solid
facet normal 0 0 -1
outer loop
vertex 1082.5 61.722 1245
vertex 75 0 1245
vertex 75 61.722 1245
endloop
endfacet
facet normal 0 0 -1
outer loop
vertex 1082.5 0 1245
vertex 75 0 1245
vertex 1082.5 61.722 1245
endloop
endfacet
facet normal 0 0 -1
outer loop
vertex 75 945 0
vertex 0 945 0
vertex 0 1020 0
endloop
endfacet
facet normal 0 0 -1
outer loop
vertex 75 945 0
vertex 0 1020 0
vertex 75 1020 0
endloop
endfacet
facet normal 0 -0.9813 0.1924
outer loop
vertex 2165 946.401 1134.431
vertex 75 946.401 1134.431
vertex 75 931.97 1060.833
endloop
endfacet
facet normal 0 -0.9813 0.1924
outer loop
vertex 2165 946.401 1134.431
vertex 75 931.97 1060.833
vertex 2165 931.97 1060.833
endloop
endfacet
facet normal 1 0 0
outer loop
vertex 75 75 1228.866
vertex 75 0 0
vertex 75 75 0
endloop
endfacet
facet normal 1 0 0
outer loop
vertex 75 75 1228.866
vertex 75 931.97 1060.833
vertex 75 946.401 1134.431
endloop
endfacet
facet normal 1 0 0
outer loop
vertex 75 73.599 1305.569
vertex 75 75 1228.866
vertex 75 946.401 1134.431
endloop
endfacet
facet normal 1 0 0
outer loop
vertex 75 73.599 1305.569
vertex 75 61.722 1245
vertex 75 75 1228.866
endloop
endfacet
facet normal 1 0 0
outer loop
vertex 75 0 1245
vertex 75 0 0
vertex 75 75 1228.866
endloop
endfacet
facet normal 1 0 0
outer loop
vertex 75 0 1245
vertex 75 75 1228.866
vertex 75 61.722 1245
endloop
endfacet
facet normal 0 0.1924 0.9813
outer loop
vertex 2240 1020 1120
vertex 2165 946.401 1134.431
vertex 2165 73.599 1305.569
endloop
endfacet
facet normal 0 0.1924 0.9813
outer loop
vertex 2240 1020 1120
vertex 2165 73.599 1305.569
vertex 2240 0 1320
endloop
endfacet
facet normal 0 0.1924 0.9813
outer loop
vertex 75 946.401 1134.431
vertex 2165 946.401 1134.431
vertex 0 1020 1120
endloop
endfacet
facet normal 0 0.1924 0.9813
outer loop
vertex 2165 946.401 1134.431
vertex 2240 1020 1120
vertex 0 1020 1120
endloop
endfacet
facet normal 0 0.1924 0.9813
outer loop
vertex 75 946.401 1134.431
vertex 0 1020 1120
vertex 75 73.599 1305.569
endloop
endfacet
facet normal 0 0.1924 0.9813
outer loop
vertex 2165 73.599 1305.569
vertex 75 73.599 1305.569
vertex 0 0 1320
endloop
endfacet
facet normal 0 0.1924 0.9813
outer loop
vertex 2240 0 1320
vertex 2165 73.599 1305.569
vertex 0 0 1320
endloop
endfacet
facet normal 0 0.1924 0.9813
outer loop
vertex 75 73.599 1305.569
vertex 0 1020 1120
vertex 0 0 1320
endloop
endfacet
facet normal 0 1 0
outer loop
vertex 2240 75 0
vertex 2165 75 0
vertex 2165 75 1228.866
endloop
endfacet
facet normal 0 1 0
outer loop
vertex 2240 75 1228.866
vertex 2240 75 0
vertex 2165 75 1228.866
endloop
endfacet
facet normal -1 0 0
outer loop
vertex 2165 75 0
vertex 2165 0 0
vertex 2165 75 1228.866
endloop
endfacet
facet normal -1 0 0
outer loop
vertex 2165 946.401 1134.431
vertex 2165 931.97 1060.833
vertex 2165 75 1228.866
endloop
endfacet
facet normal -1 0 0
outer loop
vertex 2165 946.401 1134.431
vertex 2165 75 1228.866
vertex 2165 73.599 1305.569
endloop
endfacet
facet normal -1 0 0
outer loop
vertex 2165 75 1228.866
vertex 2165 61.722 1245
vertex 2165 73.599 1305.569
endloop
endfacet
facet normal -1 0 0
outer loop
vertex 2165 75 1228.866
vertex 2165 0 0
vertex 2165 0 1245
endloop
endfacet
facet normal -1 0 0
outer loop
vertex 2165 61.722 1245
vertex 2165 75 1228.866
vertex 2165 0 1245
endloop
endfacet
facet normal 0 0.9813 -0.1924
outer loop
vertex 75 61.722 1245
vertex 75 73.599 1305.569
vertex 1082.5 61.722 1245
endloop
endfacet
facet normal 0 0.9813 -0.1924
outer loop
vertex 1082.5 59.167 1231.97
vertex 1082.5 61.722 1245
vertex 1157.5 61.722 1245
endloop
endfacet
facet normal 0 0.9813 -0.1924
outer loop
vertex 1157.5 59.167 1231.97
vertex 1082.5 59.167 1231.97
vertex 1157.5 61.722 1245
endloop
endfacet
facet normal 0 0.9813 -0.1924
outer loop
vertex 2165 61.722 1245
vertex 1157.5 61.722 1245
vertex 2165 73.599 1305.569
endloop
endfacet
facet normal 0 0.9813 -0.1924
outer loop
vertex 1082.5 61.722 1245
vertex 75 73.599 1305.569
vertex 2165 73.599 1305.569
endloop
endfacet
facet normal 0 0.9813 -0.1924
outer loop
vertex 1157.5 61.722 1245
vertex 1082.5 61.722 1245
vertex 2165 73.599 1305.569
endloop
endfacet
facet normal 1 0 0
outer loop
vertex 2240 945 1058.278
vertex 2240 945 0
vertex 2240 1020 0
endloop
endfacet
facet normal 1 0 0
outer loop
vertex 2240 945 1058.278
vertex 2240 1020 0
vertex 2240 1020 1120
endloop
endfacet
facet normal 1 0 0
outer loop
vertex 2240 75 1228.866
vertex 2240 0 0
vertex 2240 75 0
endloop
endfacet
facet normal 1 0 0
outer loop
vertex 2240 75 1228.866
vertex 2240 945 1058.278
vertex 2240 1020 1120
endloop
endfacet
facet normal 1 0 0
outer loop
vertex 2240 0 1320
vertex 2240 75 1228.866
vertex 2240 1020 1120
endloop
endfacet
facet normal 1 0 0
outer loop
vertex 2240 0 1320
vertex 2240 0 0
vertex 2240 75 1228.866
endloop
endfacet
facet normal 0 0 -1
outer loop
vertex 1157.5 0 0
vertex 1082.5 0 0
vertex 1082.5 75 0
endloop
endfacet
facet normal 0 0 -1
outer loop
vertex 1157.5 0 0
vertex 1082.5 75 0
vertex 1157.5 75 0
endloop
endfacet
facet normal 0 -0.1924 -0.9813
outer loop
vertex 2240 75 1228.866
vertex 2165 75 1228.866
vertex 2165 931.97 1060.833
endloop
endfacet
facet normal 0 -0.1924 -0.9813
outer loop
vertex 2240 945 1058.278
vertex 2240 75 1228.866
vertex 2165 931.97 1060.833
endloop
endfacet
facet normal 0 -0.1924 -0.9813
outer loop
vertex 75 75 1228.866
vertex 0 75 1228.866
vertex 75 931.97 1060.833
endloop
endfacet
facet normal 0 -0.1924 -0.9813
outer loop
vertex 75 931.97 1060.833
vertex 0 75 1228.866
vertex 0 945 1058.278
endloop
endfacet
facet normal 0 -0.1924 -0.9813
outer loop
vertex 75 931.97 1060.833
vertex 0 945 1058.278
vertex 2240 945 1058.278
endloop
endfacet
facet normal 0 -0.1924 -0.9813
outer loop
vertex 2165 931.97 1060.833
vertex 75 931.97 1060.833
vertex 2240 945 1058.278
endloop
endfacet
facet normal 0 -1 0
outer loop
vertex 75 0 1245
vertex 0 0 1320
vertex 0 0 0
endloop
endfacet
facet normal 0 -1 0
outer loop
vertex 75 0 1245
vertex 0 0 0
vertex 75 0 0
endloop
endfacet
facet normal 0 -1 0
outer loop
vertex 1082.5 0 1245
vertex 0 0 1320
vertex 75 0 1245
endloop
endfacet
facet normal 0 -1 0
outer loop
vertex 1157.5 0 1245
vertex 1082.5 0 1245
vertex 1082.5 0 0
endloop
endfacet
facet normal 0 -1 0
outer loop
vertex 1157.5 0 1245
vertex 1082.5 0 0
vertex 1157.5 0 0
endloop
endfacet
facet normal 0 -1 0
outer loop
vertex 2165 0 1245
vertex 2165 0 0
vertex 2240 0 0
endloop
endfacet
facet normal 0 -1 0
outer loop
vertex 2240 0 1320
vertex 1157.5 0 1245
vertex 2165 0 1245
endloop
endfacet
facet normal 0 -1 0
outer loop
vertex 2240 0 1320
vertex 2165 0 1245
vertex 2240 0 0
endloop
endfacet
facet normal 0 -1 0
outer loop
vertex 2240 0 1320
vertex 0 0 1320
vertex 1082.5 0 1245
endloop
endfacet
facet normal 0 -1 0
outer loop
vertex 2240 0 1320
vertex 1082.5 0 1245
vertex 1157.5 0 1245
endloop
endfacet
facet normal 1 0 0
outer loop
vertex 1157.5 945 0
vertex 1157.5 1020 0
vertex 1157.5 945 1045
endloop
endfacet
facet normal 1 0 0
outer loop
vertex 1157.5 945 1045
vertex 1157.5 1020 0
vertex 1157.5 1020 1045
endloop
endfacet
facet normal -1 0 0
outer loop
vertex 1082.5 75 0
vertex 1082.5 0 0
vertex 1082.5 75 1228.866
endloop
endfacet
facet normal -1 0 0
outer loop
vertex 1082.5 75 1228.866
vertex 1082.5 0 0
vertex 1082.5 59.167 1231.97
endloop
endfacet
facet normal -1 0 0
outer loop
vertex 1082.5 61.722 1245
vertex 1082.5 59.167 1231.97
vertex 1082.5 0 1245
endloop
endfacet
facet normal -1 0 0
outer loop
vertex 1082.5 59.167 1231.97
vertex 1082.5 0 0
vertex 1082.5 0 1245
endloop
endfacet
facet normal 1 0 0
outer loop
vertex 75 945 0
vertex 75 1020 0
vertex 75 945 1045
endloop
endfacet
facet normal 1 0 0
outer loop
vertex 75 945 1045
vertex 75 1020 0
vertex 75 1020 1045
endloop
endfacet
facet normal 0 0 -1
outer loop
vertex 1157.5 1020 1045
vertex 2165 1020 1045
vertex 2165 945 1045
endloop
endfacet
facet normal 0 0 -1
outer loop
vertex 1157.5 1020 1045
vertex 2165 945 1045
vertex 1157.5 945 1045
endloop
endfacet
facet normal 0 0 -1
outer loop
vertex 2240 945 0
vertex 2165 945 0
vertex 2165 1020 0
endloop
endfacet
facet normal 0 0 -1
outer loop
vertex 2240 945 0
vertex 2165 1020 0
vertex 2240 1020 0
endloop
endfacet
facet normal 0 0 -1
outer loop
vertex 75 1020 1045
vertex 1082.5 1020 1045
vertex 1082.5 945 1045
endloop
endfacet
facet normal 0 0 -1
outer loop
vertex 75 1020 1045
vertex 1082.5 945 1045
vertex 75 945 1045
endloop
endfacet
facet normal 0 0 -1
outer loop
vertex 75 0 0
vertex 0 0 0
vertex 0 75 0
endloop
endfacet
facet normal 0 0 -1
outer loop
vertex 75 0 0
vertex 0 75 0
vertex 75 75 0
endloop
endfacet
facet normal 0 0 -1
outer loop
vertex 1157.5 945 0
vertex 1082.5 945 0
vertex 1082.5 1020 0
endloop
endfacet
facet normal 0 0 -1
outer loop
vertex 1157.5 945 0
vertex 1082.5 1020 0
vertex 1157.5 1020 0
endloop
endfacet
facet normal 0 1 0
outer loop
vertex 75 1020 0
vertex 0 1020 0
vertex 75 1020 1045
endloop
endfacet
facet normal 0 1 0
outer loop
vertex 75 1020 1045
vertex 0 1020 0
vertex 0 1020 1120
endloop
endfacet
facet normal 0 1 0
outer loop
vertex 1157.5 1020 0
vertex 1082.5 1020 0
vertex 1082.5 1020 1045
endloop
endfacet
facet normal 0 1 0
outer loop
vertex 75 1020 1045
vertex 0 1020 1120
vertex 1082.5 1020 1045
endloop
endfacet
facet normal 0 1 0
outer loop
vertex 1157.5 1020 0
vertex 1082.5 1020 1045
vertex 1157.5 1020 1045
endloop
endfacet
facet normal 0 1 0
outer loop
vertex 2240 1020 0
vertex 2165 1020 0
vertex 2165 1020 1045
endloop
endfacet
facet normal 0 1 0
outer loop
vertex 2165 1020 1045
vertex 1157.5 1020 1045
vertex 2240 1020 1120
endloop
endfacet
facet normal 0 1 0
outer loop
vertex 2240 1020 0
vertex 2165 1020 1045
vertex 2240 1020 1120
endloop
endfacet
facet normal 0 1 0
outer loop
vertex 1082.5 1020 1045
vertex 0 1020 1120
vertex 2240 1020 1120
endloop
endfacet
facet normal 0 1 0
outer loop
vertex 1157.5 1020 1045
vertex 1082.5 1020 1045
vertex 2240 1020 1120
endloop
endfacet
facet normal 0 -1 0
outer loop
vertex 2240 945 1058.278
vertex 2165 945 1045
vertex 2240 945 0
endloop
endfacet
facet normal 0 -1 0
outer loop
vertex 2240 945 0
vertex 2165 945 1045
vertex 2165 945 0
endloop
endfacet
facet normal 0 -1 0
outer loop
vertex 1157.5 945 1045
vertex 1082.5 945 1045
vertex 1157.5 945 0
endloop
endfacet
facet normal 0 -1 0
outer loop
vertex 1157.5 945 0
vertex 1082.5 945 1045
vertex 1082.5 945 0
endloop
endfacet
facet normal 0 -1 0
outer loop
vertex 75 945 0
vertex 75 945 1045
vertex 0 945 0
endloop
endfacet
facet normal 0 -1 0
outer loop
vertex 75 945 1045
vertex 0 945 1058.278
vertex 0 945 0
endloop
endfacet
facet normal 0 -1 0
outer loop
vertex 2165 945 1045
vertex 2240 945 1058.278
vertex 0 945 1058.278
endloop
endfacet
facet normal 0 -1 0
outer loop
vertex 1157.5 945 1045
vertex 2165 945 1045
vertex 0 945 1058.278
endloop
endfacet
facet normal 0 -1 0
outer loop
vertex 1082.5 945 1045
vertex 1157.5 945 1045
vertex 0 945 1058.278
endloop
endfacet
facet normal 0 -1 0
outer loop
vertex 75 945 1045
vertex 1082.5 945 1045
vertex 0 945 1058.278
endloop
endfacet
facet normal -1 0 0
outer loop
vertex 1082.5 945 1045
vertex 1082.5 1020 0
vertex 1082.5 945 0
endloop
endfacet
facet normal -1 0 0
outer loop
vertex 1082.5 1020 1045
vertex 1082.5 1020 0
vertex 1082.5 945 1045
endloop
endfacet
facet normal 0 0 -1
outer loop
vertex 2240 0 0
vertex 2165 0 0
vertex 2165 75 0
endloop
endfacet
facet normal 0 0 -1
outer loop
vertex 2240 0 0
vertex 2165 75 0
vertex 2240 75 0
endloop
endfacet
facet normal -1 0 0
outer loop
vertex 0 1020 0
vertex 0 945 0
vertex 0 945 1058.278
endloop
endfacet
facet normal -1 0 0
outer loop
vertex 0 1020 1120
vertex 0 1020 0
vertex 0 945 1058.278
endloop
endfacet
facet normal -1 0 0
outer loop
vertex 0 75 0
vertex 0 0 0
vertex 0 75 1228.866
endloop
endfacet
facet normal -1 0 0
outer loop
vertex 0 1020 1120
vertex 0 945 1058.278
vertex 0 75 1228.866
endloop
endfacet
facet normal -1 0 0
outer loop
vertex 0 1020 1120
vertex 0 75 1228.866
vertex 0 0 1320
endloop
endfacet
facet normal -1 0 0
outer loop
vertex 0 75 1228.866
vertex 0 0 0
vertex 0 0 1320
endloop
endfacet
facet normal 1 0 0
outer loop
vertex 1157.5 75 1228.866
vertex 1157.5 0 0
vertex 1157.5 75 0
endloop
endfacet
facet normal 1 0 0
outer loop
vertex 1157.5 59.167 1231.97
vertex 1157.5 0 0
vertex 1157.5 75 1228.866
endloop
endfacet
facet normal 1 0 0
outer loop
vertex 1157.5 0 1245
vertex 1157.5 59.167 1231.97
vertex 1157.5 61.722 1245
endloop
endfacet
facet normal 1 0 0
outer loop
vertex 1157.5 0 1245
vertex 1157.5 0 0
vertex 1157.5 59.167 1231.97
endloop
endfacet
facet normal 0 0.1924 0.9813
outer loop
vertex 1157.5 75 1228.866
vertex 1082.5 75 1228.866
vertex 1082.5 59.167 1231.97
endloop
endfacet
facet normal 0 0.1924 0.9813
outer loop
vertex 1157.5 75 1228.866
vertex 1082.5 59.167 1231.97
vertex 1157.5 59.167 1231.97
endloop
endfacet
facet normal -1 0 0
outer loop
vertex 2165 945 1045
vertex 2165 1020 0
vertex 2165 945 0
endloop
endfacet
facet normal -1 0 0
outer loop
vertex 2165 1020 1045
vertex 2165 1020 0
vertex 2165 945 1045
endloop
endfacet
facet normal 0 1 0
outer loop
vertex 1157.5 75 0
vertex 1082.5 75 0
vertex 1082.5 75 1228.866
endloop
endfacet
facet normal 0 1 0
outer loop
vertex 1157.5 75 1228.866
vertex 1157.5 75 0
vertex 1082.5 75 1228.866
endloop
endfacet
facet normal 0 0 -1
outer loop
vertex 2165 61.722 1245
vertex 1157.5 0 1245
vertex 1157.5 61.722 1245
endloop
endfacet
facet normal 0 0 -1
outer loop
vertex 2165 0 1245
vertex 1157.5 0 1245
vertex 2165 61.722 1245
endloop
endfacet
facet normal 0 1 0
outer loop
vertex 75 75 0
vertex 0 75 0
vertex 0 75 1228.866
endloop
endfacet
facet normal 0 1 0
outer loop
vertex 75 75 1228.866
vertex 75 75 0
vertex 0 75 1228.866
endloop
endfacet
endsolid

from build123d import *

# Parameters (mm, degrees)
F0_W      = 2240
F0_H      = 1320
F1_DEPTH  = 1020
F3_DEPTH  = 2240.001
F5_DEPTH  = 2240.001
F6_W      = 1007.5
F6_H      = 1045
F7_DEPTH  = 75
F8_W      = 1007.5
F8_H      = 1245
F9_DEPTH  = 75
F10_W     = 2090
F10_H     = 889.4229168149
F11_DEPTH = 75


with BuildPart() as f1:
    # F0 (on Front) → F1 (new body)
    with BuildSketch(Plane.XZ):
        with Locations((1120, 660)):
            Rectangle(F0_W, F0_H)
    extrude(amount=-F1_DEPTH)

    # F2 (on face) → F3 (cut, through all)
    with BuildSketch(Plane(origin=(0, 0, 0), x_dir=(0, -1, 0), z_dir=(-1, 0, 0))):
        Polygon((-1020, 1120), (0, 1320), (-1020, 1320), align=None)
    extrude(amount=-F3_DEPTH, mode=Mode.SUBTRACT)

    # F4 (on face) → F5 (cut, through all)
    with BuildSketch(Plane(origin=(0, 0, 0), x_dir=(0, -1, 0), z_dir=(-1, 0, 0))):
        Polygon((-945, 0), (-75, 0), (-75, 1228.8659619989), (-945, 1058.2777267048), align=None)
    extrude(amount=-F5_DEPTH, mode=Mode.SUBTRACT)

    # F6 (on face) → F7 (cut, through all)
    with BuildSketch(Plane(origin=(0, 1020, 0), x_dir=(-1, 0, 0), z_dir=(0, 1, 0))):
        with Locations((-1661.25, 522.5)):
            Rectangle(F6_W, F6_H)
        with Locations((-578.75, 522.5)):
            Rectangle(F6_W, F6_H)
    extrude(amount=-F7_DEPTH, mode=Mode.SUBTRACT)

    # F8 (on face) → F9 (cut)
    with BuildSketch(Plane.XZ):
        with Locations((578.75, 622.5)):
            Rectangle(F8_W, F8_H)
        with Locations((1661.25, 622.5)):
            Rectangle(F8_W, F8_H)
    extrude(amount=-F9_DEPTH, mode=Mode.SUBTRACT)

    # F10 (on face) → F11 (cut)
    with BuildSketch(Plane(origin=(0, 249.2410218438, 1271.1292114032), x_dir=(1, 0, 0), z_dir=(0, 0.1924144607, 0.9813137497))):
        with Locations((1120, 265.7243702557)):
            Rectangle(F10_W, F10_H)
    extrude(amount=-F11_DEPTH, mode=Mode.SUBTRACT)


solid = f1.part
